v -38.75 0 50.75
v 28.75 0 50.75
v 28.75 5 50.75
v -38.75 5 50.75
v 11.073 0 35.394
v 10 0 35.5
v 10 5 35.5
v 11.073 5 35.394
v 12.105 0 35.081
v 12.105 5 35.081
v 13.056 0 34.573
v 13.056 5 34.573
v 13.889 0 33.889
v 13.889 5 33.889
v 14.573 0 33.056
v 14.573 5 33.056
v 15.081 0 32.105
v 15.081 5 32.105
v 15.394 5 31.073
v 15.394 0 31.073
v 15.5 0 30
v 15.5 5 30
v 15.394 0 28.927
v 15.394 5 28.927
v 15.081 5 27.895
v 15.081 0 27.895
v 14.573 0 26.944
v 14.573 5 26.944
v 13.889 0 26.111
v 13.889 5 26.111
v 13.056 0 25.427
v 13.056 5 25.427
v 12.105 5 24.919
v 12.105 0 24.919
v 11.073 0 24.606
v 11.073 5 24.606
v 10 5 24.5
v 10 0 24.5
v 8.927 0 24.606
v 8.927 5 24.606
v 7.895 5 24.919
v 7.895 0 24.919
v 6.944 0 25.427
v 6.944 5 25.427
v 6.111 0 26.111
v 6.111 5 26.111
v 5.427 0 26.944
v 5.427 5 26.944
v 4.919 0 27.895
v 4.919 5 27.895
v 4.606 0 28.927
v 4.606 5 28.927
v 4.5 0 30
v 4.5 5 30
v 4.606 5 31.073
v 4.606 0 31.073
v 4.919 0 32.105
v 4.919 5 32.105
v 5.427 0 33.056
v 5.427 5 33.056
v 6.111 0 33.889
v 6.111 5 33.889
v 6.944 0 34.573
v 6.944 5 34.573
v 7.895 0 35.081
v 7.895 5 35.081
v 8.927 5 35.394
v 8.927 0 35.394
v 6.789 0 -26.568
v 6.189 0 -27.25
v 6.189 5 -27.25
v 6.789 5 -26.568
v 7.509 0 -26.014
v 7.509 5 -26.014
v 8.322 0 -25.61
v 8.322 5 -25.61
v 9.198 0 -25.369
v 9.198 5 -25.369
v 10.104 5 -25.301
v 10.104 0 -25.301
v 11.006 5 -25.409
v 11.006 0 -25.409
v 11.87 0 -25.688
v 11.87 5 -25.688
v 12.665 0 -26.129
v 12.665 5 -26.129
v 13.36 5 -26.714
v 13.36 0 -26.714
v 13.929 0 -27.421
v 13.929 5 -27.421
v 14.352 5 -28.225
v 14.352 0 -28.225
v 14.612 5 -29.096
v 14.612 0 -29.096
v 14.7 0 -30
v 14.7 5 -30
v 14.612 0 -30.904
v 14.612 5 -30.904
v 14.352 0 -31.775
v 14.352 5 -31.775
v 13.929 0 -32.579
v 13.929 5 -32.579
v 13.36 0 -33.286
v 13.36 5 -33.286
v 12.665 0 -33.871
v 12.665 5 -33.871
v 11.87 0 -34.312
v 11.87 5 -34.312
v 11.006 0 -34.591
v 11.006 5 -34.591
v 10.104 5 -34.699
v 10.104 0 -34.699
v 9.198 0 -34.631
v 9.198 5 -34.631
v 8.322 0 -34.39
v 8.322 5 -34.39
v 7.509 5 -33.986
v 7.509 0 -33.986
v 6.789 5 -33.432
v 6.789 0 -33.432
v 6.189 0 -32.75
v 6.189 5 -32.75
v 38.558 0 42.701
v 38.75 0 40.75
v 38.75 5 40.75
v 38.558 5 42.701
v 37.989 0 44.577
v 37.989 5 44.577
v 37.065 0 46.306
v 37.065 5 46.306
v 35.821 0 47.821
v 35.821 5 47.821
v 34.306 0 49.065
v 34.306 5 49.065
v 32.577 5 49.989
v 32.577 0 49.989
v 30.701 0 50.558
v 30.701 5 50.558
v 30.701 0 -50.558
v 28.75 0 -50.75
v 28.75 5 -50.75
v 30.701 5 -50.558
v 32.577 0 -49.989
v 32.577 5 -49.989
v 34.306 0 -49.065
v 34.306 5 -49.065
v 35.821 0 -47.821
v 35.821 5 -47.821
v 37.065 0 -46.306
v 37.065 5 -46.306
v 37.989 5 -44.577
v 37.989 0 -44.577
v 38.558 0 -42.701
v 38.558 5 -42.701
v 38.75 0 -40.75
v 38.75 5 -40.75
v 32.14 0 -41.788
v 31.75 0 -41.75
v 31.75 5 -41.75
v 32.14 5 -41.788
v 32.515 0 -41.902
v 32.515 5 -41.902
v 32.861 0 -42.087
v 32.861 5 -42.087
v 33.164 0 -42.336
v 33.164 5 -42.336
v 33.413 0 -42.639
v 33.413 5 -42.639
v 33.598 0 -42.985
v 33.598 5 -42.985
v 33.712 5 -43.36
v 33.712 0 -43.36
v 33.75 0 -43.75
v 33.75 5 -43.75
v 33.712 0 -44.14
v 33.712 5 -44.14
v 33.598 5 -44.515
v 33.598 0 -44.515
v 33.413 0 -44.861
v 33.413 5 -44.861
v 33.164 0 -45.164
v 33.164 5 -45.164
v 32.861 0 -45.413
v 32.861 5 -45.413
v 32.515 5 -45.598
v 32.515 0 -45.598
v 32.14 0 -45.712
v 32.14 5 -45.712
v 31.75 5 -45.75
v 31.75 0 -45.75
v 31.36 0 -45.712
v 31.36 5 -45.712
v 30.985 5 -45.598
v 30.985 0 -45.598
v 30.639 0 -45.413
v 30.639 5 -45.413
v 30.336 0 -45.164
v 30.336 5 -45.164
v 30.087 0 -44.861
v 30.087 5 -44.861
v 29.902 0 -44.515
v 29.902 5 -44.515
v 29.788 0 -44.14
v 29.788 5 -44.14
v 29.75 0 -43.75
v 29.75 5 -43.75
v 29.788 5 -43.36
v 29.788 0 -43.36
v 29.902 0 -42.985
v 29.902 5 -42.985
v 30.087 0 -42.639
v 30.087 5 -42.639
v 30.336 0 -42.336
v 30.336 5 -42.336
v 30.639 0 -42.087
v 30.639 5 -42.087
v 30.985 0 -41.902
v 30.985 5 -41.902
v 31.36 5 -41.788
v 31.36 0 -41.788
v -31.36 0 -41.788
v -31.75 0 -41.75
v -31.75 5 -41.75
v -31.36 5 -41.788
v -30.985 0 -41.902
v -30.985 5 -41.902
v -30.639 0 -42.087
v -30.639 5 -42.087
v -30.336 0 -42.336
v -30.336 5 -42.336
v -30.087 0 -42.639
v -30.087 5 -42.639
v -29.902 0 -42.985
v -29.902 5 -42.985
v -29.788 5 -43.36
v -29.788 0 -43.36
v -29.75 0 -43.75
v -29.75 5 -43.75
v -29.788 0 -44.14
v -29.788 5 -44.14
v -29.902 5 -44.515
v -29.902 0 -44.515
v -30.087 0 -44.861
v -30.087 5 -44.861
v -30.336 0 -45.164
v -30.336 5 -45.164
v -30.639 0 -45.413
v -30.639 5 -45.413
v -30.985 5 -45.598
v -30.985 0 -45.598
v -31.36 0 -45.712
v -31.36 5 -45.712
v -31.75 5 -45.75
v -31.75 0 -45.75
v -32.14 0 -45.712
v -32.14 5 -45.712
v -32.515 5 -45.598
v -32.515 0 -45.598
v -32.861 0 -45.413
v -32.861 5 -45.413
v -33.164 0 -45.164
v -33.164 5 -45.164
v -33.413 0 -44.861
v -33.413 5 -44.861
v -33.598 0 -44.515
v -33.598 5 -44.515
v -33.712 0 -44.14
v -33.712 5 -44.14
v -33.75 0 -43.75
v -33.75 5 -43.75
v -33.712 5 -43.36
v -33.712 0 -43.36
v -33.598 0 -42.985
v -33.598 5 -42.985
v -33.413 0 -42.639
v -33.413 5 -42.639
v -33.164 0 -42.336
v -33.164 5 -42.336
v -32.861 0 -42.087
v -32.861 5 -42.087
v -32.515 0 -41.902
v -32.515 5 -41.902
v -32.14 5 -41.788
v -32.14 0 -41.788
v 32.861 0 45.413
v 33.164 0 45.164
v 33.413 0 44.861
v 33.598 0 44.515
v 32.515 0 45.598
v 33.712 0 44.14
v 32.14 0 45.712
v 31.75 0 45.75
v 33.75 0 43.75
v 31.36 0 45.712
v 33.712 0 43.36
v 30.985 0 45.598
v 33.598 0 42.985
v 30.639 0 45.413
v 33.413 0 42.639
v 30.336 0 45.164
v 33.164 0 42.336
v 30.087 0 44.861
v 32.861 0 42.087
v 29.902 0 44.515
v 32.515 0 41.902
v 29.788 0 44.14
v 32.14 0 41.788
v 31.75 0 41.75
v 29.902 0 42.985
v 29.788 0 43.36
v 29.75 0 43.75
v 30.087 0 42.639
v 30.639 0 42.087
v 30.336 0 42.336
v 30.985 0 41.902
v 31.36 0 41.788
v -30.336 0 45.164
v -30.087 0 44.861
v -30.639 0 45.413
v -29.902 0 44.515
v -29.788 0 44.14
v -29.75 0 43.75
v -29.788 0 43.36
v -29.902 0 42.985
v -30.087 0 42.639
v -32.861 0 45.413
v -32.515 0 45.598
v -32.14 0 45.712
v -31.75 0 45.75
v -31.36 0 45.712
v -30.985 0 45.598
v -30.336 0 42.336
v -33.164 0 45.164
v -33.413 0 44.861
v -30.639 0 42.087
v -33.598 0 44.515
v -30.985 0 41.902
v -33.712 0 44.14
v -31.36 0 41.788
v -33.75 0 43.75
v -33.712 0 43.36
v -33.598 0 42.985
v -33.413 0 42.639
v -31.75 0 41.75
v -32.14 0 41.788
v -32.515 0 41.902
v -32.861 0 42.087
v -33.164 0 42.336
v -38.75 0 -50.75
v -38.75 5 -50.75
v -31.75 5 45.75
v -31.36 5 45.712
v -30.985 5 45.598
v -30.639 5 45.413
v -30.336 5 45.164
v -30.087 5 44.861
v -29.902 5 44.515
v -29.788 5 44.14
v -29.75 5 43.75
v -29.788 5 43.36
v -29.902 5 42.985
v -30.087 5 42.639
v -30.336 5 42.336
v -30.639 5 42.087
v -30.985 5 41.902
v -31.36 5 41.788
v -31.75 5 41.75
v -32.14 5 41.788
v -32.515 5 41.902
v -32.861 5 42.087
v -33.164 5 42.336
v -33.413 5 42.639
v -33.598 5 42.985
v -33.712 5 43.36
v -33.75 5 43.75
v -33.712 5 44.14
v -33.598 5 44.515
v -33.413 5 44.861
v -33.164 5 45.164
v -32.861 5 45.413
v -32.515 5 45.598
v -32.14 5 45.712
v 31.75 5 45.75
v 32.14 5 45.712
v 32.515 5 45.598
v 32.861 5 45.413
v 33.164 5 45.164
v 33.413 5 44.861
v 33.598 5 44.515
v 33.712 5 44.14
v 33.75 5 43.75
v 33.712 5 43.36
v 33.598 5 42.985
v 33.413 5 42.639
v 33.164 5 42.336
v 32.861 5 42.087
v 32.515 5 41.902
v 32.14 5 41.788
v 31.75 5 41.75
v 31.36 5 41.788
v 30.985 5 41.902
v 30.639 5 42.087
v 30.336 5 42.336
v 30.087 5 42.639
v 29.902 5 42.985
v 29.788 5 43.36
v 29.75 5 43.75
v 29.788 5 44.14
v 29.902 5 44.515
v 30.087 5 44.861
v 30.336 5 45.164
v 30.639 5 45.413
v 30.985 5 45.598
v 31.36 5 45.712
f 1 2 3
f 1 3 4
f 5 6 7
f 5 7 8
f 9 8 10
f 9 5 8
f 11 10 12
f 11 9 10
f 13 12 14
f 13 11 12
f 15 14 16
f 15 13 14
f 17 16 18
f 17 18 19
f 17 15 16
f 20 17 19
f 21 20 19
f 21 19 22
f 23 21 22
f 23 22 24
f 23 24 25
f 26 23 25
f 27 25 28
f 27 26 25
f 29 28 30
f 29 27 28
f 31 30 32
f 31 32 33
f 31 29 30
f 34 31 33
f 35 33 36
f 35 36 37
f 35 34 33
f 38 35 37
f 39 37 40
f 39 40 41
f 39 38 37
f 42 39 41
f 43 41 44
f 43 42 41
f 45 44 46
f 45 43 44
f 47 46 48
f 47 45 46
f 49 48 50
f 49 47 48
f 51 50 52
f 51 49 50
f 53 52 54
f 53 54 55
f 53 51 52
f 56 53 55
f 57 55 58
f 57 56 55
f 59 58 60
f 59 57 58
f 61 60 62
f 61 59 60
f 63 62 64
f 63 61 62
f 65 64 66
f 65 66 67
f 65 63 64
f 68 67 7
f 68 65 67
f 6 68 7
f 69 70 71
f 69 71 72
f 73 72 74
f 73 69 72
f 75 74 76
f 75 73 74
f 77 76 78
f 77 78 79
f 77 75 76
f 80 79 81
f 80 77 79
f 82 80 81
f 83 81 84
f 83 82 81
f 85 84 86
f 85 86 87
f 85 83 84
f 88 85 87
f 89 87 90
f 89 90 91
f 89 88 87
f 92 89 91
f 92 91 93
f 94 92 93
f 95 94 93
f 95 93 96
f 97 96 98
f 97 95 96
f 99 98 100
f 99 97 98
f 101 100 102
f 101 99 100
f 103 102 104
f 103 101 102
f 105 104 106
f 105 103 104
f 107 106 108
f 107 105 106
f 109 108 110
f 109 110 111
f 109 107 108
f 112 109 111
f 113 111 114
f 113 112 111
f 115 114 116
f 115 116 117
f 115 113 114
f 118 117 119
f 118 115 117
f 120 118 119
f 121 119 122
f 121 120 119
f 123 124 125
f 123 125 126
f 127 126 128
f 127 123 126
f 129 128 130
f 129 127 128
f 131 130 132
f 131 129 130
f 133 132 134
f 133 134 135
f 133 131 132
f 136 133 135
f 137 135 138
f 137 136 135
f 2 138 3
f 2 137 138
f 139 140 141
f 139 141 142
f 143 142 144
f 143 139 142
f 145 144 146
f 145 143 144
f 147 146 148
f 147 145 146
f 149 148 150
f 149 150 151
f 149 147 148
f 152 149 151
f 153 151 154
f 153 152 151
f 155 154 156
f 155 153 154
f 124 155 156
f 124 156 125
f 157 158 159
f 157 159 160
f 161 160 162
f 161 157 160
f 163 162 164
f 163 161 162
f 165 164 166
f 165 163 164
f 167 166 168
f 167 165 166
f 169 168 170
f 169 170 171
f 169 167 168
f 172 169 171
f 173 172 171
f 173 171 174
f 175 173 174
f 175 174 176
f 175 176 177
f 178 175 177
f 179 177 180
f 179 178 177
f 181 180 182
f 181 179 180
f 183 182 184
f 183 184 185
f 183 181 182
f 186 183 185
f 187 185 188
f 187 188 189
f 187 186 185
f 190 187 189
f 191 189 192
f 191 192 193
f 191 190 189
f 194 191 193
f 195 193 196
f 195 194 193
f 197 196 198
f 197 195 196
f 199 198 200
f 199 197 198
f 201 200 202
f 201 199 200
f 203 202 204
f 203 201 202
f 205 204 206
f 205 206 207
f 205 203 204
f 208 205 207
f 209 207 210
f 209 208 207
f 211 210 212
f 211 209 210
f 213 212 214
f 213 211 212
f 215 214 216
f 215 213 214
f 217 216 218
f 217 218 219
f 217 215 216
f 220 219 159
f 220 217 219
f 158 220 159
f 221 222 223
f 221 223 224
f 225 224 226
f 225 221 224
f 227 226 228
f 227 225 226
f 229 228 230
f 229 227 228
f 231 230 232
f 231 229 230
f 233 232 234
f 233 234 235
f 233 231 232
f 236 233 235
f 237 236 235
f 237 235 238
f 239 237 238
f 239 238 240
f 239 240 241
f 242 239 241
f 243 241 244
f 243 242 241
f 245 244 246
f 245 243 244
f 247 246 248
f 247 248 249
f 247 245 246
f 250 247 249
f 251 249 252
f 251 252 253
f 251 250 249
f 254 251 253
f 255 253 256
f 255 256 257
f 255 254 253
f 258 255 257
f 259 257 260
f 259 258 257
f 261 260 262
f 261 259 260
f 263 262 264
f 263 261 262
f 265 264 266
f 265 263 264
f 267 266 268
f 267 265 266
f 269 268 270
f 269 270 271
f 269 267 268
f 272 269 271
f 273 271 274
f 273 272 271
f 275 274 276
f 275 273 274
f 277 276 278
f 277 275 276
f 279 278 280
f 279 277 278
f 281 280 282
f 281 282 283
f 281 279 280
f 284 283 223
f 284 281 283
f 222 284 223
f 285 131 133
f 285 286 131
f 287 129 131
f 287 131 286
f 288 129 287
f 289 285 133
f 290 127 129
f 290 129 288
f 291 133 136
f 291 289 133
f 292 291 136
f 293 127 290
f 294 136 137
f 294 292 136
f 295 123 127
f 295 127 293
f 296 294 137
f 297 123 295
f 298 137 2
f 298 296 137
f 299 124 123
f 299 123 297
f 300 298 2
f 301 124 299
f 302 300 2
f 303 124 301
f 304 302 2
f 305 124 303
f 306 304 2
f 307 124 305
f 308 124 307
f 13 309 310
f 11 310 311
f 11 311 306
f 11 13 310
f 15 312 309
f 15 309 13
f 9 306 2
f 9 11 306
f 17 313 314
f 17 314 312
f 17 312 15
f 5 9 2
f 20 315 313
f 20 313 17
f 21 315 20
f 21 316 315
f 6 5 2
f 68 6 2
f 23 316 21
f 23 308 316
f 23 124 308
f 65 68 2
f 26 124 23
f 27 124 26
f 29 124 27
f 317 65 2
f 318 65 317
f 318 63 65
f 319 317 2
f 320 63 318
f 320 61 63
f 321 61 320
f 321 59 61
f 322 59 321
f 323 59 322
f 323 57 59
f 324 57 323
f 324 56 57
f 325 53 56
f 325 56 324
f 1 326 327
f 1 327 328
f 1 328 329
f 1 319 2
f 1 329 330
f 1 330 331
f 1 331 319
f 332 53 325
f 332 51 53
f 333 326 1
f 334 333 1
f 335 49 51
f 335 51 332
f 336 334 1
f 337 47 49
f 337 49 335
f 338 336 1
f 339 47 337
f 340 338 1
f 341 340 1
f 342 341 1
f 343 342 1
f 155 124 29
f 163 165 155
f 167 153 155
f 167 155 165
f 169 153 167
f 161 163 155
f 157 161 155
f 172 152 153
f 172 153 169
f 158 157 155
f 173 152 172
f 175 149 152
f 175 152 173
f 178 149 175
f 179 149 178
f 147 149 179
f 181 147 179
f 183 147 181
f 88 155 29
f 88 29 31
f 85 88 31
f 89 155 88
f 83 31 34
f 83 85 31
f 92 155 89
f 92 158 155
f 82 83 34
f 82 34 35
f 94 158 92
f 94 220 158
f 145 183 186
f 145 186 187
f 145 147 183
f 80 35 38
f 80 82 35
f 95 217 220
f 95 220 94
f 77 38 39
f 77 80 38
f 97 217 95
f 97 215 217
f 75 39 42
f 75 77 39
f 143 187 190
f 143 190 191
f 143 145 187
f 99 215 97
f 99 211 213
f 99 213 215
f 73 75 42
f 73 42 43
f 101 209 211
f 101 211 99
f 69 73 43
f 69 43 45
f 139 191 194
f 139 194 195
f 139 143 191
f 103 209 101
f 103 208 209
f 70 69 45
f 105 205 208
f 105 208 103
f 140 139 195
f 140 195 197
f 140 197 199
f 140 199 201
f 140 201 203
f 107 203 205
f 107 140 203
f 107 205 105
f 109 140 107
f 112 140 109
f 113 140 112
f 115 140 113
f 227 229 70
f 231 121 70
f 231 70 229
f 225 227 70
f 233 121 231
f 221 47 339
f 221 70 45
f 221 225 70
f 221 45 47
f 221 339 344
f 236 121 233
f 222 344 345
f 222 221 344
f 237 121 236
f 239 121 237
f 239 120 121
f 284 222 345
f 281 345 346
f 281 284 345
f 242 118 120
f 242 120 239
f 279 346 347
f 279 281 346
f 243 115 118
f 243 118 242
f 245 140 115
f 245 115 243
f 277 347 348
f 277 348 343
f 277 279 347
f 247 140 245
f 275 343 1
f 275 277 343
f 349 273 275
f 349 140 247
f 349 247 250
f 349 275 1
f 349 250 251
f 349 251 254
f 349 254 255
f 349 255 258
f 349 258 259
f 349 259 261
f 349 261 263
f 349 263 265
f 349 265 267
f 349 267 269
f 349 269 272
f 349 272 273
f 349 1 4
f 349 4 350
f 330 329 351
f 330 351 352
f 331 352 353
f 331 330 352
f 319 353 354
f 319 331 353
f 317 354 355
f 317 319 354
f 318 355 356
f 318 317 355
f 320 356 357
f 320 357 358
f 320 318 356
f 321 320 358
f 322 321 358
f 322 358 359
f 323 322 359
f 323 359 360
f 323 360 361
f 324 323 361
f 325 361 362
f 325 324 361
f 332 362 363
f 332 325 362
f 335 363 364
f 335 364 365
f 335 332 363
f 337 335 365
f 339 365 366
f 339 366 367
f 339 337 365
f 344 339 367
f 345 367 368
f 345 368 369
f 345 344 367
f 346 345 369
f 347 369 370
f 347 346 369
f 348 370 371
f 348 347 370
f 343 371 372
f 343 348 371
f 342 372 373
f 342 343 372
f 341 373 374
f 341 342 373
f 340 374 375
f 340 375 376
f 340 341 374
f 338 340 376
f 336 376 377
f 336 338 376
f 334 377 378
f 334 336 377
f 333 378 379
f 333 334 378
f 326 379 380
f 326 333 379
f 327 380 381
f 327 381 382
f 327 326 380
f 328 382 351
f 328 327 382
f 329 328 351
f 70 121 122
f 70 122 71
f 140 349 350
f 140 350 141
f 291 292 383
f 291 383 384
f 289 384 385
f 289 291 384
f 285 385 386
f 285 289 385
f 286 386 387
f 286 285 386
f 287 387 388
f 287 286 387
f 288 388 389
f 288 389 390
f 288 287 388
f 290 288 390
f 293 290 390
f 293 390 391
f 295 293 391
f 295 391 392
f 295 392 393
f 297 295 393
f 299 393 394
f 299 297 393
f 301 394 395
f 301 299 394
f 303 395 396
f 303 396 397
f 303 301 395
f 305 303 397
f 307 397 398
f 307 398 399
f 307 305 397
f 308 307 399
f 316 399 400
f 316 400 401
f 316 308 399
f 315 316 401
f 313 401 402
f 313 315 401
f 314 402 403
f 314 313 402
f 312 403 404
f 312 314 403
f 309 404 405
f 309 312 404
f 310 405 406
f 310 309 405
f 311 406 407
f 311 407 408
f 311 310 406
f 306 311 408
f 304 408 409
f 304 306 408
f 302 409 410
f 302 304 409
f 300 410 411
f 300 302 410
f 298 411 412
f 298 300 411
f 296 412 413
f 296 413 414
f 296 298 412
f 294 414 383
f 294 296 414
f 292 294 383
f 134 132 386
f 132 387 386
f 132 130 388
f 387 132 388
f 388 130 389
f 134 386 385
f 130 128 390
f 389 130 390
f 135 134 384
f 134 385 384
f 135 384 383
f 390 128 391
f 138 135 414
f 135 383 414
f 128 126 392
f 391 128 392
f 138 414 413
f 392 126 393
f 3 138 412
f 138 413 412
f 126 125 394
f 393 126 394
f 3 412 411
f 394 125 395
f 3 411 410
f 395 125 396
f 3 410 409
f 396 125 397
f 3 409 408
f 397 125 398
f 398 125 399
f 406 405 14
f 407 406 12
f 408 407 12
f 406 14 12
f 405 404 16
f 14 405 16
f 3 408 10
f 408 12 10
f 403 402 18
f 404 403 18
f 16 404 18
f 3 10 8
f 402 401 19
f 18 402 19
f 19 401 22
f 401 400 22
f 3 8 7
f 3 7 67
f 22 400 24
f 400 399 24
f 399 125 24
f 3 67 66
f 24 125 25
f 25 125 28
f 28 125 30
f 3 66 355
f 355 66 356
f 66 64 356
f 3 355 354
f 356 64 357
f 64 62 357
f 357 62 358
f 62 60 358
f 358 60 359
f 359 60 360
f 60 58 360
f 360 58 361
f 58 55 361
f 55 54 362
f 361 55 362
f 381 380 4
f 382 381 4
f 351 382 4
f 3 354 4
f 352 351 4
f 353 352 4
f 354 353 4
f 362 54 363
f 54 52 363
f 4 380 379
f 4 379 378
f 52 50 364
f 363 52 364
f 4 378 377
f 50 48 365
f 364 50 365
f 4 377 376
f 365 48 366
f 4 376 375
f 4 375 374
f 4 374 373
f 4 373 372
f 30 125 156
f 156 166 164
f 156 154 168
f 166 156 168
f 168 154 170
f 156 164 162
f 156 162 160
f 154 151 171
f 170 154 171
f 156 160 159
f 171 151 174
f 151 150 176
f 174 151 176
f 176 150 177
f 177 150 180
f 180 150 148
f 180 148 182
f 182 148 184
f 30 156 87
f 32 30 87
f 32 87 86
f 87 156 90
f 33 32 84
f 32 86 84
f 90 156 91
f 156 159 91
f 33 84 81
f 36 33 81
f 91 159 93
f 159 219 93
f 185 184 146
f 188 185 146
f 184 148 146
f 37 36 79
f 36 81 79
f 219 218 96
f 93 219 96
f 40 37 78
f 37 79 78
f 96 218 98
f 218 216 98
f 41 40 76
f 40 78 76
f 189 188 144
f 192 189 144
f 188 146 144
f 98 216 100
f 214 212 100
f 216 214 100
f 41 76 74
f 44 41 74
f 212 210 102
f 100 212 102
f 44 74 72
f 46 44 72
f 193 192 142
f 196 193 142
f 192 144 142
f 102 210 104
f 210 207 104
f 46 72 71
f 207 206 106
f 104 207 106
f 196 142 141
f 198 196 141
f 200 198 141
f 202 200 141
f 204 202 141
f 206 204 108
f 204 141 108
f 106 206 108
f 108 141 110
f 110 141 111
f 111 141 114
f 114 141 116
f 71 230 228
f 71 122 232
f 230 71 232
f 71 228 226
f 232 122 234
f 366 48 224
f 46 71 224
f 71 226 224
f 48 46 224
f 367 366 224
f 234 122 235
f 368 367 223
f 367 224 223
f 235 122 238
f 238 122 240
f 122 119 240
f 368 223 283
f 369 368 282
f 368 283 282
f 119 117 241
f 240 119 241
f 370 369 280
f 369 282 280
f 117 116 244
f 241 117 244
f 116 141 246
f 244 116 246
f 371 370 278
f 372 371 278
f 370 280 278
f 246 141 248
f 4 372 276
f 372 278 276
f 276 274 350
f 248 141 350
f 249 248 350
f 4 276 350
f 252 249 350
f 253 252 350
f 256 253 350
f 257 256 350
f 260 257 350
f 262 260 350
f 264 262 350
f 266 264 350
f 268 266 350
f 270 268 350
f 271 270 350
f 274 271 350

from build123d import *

# Parameters (mm, degrees)
SKETCH3_R           = 2
SKETCH3_R_2         = 5.5
BOSS_EXTRUDE2_DEPTH = 5


with BuildPart() as part:
    # Sketch3 → Boss-Extrude2 (new body)
    with BuildSketch(Plane(origin=(0, 0, 0), x_dir=(1, 0, 0), z_dir=(0, 1, 0))):
        with BuildLine():
            Line((-38.75, 50.75), (28.75, 50.75))
            ThreePointArc((28.75, 50.75), (35.821067812, 47.821067812), (38.75, 40.75))
            Line((38.75, 40.75), (38.75, -40.75))
            ThreePointArc((38.75, -40.75), (35.821067812, -47.821067812), (28.75, -50.75))
            Line((28.75, -50.75), (-38.75, -50.75))
            Line((-38.75, -50.75), (-38.75, 50.75))
        make_face()
        with Locations(Location((-31.75, -43.75, 0), (0, 0, 270))):
            Circle(SKETCH3_R, mode=Mode.SUBTRACT)
        with Locations(Location((-31.75, 43.75, 0), (0, 0, 270))):
            Circle(SKETCH3_R, mode=Mode.SUBTRACT)
        with Locations(Location((31.75, 43.75, 0), (0, 0, 270))):
            Circle(SKETCH3_R, mode=Mode.SUBTRACT)
        with Locations(Location((31.75, -43.75, 0), (0, 0, 270))):
            Circle(SKETCH3_R, mode=Mode.SUBTRACT)
        with Locations(Location((10, -30, 0), (0, 0, 270))):
            Circle(SKETCH3_R_2, mode=Mode.SUBTRACT)
        with BuildLine():
            Line((6.188504231, 32.75), (6.188504231, 27.25))
            ThreePointArc((6.188504231, 27.25), (14.7, 30), (6.188504231, 32.75))
        make_face(mode=Mode.SUBTRACT)
    extrude(amount=BOSS_EXTRUDE2_DEPTH)


solid = part.part
